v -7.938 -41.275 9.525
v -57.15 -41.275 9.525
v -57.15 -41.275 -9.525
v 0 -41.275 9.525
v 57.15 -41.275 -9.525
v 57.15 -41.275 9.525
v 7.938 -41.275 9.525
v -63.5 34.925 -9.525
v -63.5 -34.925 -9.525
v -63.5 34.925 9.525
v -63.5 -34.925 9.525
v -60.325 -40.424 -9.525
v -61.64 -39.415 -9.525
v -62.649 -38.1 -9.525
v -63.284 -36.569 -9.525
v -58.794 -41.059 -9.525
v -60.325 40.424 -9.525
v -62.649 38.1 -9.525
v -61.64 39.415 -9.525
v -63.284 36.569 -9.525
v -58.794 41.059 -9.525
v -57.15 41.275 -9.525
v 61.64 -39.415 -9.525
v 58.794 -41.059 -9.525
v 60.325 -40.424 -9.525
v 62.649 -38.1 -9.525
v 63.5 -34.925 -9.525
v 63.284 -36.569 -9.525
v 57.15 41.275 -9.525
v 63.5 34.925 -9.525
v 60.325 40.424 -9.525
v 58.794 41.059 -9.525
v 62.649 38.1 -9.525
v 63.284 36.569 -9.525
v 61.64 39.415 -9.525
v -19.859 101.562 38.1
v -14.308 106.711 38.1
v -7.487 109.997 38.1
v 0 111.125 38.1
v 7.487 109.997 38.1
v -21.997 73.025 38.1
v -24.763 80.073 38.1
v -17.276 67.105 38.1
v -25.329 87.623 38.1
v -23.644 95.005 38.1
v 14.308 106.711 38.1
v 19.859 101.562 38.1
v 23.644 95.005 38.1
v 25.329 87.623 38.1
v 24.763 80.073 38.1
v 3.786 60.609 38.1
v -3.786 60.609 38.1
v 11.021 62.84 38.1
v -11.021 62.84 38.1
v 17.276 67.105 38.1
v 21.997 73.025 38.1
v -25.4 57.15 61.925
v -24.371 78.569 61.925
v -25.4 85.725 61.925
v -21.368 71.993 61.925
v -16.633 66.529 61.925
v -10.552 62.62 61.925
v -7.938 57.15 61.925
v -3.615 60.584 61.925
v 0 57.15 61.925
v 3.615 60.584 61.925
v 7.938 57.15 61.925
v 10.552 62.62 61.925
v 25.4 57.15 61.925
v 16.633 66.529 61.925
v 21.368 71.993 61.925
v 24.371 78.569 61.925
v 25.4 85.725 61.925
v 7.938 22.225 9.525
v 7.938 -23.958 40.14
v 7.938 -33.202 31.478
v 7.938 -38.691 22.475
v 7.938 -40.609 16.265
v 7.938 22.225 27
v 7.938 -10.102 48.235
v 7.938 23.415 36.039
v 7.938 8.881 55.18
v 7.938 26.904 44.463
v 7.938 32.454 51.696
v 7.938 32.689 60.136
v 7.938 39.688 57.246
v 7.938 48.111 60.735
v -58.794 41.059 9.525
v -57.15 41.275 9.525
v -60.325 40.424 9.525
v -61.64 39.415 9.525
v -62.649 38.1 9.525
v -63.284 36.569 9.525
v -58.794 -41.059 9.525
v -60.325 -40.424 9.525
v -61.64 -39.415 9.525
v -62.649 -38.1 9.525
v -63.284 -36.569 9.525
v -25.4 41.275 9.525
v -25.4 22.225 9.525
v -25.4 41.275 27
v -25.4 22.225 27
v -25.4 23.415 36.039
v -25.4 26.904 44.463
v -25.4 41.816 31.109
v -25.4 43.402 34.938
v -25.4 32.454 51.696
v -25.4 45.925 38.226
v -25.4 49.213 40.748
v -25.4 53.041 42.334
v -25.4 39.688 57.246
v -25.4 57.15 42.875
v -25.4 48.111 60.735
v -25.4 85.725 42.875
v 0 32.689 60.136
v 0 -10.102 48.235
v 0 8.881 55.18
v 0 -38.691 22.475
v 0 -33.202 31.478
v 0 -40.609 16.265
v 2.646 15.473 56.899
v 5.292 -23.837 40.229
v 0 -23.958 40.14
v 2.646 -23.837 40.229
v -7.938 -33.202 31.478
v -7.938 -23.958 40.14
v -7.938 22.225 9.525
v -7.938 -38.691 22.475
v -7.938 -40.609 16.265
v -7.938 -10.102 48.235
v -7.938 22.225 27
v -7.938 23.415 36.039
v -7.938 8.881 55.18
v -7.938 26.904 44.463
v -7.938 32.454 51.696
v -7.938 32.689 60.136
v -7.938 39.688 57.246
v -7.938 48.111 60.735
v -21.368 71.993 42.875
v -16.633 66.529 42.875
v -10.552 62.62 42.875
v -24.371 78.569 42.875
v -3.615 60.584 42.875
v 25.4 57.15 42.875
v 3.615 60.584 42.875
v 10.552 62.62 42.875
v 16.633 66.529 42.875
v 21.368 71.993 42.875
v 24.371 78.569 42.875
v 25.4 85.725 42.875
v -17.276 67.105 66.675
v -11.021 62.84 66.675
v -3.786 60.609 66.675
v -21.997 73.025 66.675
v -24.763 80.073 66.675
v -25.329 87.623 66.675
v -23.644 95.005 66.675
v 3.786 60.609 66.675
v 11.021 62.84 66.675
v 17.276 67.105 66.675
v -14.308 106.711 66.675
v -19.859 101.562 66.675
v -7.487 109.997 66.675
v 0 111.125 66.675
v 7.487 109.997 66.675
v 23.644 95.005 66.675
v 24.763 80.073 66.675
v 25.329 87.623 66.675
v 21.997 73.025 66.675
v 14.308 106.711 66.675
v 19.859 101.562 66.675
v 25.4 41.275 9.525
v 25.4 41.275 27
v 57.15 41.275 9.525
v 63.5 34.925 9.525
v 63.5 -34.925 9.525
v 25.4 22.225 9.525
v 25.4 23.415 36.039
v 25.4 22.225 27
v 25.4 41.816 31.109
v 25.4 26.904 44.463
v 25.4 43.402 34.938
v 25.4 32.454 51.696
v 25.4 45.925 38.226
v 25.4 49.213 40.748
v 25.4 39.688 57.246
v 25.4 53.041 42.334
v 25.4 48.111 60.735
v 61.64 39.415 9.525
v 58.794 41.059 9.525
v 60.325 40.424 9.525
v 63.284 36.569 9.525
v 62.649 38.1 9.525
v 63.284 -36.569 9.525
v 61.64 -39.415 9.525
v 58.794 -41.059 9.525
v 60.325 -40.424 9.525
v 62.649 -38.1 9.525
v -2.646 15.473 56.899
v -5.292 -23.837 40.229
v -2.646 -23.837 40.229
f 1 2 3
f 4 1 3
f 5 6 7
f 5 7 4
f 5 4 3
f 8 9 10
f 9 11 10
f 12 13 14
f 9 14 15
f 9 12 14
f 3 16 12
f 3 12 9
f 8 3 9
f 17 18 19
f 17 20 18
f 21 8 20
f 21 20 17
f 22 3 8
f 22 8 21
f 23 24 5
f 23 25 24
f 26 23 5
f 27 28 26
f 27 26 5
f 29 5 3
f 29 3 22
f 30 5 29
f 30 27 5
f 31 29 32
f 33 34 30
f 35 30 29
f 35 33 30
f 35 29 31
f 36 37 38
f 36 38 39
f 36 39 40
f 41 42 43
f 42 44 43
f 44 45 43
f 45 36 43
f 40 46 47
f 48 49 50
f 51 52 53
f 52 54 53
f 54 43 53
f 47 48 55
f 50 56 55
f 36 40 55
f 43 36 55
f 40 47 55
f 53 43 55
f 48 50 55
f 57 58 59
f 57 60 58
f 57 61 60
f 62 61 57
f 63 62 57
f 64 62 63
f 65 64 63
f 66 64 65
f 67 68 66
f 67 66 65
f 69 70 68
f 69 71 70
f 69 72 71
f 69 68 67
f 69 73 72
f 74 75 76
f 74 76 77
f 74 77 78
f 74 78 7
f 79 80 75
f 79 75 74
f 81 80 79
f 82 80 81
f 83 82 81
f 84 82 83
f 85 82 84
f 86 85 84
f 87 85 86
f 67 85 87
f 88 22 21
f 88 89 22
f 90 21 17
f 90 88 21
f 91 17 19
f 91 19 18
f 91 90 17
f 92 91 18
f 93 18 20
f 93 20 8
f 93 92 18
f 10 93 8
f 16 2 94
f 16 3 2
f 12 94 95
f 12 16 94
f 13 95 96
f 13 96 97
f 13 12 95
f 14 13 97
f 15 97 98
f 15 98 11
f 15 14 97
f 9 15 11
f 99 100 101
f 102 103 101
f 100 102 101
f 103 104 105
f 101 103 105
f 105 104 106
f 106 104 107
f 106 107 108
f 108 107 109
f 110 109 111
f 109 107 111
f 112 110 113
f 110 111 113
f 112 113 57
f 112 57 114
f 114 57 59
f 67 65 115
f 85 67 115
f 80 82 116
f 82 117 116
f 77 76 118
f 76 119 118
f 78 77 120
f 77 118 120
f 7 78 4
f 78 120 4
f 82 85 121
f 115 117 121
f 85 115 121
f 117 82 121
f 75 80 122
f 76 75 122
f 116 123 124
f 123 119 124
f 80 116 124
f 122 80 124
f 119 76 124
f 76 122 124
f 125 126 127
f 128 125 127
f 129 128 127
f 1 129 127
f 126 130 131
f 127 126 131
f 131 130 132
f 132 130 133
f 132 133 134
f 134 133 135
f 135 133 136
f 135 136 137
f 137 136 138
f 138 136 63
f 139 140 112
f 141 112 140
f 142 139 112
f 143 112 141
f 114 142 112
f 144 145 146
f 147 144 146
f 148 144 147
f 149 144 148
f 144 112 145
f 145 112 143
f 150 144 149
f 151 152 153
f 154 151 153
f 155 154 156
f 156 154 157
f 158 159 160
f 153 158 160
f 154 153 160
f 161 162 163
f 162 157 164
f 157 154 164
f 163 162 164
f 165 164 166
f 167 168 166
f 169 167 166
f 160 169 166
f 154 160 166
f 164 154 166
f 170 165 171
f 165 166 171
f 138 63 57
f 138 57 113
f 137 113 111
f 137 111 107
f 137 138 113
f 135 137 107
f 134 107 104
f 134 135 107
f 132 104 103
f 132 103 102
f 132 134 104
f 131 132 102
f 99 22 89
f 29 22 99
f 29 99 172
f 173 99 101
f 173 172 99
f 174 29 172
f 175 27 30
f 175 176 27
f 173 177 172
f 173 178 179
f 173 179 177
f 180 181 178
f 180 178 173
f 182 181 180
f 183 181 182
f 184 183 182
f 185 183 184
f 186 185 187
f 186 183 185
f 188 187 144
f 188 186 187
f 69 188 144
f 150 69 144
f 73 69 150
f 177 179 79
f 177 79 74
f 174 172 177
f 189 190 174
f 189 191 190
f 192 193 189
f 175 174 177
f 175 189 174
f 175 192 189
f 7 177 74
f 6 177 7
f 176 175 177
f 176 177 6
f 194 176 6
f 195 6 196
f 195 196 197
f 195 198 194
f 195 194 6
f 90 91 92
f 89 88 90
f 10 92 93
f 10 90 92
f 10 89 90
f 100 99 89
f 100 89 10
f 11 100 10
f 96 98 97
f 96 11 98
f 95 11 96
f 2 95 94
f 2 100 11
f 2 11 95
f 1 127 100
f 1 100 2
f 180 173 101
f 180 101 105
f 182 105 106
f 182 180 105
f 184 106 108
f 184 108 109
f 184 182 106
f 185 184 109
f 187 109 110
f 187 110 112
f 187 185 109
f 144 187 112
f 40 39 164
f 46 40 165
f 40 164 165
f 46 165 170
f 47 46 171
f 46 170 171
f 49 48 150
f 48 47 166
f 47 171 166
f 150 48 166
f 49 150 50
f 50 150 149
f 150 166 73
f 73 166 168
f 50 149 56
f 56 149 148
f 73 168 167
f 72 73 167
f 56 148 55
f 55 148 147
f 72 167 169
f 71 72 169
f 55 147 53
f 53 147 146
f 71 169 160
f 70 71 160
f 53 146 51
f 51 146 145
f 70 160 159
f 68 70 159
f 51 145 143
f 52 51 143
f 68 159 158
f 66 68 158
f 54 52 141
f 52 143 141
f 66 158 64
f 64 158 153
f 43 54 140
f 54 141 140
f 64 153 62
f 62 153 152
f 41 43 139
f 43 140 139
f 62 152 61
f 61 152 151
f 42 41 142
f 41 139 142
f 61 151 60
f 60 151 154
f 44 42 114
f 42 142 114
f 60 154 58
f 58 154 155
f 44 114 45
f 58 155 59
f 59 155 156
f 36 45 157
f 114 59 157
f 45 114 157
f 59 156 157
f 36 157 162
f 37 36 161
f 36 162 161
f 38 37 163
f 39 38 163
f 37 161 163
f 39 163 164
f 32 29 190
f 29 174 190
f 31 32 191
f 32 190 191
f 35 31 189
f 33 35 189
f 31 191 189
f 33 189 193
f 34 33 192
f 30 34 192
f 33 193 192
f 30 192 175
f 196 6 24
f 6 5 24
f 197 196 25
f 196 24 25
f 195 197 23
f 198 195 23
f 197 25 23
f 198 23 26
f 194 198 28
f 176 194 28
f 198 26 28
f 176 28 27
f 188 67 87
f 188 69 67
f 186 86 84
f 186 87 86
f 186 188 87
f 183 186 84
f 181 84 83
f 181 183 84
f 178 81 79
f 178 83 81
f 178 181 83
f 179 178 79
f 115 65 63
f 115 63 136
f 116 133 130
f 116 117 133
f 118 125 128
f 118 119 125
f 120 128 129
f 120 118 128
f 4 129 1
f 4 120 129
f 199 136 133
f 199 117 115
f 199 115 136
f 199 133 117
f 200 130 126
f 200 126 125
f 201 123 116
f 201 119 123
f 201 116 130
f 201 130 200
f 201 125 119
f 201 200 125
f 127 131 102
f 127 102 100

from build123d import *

# Parameters (mm, degrees)
F1_DEPTH = 63.5
F0_W     = 25.4
F0_H     = 19.05
F2_DEPTH = 25.4
F3_DEPTH = 7.9375
F5_R     = 6.35


with BuildPart() as f1:
    # F0 (on Right) → F1 (new body, symmetric)
    with BuildSketch(Plane.YZ):
        Polygon((-41.275, -9.525), (41.275, -9.525), (41.275, 9.525), (22.225, 9.525), (-41.275, 9.525), align=None)
    extrude(amount=F1_DEPTH, both=True)

    # F0 (on Right) → F2 (join, symmetric)
    with BuildSketch(Plane.YZ):
        with BuildLine():
            Line((22.225, 9.525), (41.275, 9.525))
            Line((41.275, 9.525), (41.275, 27.0002))
            ThreePointArc((41.275, 27.0002), (45.9246798487, 38.2255201513), (57.15, 42.8752))
            Line((57.15, 42.8752), (60.325, 42.8752))
            Line((60.325, 42.8752), (60.325, 61.9252))
            Line((60.325, 61.9252), (57.15, 61.9252))
            ThreePointArc((57.15, 61.9252), (32.4542956671, 51.6959043329), (22.225, 27.0002))
            Line((22.225, 27.0002), (22.225, 9.525))
        make_face()
        with Locations((73.025, 52.4002)):
            Rectangle(F0_W, F0_H)
    extrude(amount=F2_DEPTH, both=True)

    # F0 (on Right) → F3 (join, symmetric)
    with BuildSketch(Plane.YZ):
        with BuildLine():
            add(Edge.make_bspline(
                [(57.15, 61.9252), (20.7915678899, 61.9252), (-41.275, 48.0412916491), (-41.275, 9.525)],
                knots=[0, 0, 0, 0, 111.5045361635, 111.5045361635, 111.5045361635, 111.5045361635], degree=3))
            Line((-41.275, 9.525), (22.225, 9.525))
            Line((22.225, 9.525), (22.225, 27.0002))
            ThreePointArc((22.225, 27.0002), (32.4542956671, 51.6959043329), (57.15, 61.9252))
        make_face()
    extrude(amount=F3_DEPTH, both=True)

    # F0 (on Right) → F4 (revolve)
    with BuildSketch(Plane.YZ):
        Polygon((85.725, 66.675), (85.725, 61.9252), (85.725, 42.8752), (85.725, 38.1), (111.125, 38.1), (111.125, 66.675), align=None)
    revolve(axis=Axis((0, 85.725, 52.3875), (0, 0, -1)))

    # F5
    f5_edges = [f1.edges().sort_by_distance(p)[0] for p in [
        (63.5, 41.275, 0),
        (63.5, -41.275, 0),
        (-63.5, -41.275, 0),
        (-63.5, 41.275, 0),
    ]]
    fillet(f5_edges, radius=F5_R)


solid = f1.part
